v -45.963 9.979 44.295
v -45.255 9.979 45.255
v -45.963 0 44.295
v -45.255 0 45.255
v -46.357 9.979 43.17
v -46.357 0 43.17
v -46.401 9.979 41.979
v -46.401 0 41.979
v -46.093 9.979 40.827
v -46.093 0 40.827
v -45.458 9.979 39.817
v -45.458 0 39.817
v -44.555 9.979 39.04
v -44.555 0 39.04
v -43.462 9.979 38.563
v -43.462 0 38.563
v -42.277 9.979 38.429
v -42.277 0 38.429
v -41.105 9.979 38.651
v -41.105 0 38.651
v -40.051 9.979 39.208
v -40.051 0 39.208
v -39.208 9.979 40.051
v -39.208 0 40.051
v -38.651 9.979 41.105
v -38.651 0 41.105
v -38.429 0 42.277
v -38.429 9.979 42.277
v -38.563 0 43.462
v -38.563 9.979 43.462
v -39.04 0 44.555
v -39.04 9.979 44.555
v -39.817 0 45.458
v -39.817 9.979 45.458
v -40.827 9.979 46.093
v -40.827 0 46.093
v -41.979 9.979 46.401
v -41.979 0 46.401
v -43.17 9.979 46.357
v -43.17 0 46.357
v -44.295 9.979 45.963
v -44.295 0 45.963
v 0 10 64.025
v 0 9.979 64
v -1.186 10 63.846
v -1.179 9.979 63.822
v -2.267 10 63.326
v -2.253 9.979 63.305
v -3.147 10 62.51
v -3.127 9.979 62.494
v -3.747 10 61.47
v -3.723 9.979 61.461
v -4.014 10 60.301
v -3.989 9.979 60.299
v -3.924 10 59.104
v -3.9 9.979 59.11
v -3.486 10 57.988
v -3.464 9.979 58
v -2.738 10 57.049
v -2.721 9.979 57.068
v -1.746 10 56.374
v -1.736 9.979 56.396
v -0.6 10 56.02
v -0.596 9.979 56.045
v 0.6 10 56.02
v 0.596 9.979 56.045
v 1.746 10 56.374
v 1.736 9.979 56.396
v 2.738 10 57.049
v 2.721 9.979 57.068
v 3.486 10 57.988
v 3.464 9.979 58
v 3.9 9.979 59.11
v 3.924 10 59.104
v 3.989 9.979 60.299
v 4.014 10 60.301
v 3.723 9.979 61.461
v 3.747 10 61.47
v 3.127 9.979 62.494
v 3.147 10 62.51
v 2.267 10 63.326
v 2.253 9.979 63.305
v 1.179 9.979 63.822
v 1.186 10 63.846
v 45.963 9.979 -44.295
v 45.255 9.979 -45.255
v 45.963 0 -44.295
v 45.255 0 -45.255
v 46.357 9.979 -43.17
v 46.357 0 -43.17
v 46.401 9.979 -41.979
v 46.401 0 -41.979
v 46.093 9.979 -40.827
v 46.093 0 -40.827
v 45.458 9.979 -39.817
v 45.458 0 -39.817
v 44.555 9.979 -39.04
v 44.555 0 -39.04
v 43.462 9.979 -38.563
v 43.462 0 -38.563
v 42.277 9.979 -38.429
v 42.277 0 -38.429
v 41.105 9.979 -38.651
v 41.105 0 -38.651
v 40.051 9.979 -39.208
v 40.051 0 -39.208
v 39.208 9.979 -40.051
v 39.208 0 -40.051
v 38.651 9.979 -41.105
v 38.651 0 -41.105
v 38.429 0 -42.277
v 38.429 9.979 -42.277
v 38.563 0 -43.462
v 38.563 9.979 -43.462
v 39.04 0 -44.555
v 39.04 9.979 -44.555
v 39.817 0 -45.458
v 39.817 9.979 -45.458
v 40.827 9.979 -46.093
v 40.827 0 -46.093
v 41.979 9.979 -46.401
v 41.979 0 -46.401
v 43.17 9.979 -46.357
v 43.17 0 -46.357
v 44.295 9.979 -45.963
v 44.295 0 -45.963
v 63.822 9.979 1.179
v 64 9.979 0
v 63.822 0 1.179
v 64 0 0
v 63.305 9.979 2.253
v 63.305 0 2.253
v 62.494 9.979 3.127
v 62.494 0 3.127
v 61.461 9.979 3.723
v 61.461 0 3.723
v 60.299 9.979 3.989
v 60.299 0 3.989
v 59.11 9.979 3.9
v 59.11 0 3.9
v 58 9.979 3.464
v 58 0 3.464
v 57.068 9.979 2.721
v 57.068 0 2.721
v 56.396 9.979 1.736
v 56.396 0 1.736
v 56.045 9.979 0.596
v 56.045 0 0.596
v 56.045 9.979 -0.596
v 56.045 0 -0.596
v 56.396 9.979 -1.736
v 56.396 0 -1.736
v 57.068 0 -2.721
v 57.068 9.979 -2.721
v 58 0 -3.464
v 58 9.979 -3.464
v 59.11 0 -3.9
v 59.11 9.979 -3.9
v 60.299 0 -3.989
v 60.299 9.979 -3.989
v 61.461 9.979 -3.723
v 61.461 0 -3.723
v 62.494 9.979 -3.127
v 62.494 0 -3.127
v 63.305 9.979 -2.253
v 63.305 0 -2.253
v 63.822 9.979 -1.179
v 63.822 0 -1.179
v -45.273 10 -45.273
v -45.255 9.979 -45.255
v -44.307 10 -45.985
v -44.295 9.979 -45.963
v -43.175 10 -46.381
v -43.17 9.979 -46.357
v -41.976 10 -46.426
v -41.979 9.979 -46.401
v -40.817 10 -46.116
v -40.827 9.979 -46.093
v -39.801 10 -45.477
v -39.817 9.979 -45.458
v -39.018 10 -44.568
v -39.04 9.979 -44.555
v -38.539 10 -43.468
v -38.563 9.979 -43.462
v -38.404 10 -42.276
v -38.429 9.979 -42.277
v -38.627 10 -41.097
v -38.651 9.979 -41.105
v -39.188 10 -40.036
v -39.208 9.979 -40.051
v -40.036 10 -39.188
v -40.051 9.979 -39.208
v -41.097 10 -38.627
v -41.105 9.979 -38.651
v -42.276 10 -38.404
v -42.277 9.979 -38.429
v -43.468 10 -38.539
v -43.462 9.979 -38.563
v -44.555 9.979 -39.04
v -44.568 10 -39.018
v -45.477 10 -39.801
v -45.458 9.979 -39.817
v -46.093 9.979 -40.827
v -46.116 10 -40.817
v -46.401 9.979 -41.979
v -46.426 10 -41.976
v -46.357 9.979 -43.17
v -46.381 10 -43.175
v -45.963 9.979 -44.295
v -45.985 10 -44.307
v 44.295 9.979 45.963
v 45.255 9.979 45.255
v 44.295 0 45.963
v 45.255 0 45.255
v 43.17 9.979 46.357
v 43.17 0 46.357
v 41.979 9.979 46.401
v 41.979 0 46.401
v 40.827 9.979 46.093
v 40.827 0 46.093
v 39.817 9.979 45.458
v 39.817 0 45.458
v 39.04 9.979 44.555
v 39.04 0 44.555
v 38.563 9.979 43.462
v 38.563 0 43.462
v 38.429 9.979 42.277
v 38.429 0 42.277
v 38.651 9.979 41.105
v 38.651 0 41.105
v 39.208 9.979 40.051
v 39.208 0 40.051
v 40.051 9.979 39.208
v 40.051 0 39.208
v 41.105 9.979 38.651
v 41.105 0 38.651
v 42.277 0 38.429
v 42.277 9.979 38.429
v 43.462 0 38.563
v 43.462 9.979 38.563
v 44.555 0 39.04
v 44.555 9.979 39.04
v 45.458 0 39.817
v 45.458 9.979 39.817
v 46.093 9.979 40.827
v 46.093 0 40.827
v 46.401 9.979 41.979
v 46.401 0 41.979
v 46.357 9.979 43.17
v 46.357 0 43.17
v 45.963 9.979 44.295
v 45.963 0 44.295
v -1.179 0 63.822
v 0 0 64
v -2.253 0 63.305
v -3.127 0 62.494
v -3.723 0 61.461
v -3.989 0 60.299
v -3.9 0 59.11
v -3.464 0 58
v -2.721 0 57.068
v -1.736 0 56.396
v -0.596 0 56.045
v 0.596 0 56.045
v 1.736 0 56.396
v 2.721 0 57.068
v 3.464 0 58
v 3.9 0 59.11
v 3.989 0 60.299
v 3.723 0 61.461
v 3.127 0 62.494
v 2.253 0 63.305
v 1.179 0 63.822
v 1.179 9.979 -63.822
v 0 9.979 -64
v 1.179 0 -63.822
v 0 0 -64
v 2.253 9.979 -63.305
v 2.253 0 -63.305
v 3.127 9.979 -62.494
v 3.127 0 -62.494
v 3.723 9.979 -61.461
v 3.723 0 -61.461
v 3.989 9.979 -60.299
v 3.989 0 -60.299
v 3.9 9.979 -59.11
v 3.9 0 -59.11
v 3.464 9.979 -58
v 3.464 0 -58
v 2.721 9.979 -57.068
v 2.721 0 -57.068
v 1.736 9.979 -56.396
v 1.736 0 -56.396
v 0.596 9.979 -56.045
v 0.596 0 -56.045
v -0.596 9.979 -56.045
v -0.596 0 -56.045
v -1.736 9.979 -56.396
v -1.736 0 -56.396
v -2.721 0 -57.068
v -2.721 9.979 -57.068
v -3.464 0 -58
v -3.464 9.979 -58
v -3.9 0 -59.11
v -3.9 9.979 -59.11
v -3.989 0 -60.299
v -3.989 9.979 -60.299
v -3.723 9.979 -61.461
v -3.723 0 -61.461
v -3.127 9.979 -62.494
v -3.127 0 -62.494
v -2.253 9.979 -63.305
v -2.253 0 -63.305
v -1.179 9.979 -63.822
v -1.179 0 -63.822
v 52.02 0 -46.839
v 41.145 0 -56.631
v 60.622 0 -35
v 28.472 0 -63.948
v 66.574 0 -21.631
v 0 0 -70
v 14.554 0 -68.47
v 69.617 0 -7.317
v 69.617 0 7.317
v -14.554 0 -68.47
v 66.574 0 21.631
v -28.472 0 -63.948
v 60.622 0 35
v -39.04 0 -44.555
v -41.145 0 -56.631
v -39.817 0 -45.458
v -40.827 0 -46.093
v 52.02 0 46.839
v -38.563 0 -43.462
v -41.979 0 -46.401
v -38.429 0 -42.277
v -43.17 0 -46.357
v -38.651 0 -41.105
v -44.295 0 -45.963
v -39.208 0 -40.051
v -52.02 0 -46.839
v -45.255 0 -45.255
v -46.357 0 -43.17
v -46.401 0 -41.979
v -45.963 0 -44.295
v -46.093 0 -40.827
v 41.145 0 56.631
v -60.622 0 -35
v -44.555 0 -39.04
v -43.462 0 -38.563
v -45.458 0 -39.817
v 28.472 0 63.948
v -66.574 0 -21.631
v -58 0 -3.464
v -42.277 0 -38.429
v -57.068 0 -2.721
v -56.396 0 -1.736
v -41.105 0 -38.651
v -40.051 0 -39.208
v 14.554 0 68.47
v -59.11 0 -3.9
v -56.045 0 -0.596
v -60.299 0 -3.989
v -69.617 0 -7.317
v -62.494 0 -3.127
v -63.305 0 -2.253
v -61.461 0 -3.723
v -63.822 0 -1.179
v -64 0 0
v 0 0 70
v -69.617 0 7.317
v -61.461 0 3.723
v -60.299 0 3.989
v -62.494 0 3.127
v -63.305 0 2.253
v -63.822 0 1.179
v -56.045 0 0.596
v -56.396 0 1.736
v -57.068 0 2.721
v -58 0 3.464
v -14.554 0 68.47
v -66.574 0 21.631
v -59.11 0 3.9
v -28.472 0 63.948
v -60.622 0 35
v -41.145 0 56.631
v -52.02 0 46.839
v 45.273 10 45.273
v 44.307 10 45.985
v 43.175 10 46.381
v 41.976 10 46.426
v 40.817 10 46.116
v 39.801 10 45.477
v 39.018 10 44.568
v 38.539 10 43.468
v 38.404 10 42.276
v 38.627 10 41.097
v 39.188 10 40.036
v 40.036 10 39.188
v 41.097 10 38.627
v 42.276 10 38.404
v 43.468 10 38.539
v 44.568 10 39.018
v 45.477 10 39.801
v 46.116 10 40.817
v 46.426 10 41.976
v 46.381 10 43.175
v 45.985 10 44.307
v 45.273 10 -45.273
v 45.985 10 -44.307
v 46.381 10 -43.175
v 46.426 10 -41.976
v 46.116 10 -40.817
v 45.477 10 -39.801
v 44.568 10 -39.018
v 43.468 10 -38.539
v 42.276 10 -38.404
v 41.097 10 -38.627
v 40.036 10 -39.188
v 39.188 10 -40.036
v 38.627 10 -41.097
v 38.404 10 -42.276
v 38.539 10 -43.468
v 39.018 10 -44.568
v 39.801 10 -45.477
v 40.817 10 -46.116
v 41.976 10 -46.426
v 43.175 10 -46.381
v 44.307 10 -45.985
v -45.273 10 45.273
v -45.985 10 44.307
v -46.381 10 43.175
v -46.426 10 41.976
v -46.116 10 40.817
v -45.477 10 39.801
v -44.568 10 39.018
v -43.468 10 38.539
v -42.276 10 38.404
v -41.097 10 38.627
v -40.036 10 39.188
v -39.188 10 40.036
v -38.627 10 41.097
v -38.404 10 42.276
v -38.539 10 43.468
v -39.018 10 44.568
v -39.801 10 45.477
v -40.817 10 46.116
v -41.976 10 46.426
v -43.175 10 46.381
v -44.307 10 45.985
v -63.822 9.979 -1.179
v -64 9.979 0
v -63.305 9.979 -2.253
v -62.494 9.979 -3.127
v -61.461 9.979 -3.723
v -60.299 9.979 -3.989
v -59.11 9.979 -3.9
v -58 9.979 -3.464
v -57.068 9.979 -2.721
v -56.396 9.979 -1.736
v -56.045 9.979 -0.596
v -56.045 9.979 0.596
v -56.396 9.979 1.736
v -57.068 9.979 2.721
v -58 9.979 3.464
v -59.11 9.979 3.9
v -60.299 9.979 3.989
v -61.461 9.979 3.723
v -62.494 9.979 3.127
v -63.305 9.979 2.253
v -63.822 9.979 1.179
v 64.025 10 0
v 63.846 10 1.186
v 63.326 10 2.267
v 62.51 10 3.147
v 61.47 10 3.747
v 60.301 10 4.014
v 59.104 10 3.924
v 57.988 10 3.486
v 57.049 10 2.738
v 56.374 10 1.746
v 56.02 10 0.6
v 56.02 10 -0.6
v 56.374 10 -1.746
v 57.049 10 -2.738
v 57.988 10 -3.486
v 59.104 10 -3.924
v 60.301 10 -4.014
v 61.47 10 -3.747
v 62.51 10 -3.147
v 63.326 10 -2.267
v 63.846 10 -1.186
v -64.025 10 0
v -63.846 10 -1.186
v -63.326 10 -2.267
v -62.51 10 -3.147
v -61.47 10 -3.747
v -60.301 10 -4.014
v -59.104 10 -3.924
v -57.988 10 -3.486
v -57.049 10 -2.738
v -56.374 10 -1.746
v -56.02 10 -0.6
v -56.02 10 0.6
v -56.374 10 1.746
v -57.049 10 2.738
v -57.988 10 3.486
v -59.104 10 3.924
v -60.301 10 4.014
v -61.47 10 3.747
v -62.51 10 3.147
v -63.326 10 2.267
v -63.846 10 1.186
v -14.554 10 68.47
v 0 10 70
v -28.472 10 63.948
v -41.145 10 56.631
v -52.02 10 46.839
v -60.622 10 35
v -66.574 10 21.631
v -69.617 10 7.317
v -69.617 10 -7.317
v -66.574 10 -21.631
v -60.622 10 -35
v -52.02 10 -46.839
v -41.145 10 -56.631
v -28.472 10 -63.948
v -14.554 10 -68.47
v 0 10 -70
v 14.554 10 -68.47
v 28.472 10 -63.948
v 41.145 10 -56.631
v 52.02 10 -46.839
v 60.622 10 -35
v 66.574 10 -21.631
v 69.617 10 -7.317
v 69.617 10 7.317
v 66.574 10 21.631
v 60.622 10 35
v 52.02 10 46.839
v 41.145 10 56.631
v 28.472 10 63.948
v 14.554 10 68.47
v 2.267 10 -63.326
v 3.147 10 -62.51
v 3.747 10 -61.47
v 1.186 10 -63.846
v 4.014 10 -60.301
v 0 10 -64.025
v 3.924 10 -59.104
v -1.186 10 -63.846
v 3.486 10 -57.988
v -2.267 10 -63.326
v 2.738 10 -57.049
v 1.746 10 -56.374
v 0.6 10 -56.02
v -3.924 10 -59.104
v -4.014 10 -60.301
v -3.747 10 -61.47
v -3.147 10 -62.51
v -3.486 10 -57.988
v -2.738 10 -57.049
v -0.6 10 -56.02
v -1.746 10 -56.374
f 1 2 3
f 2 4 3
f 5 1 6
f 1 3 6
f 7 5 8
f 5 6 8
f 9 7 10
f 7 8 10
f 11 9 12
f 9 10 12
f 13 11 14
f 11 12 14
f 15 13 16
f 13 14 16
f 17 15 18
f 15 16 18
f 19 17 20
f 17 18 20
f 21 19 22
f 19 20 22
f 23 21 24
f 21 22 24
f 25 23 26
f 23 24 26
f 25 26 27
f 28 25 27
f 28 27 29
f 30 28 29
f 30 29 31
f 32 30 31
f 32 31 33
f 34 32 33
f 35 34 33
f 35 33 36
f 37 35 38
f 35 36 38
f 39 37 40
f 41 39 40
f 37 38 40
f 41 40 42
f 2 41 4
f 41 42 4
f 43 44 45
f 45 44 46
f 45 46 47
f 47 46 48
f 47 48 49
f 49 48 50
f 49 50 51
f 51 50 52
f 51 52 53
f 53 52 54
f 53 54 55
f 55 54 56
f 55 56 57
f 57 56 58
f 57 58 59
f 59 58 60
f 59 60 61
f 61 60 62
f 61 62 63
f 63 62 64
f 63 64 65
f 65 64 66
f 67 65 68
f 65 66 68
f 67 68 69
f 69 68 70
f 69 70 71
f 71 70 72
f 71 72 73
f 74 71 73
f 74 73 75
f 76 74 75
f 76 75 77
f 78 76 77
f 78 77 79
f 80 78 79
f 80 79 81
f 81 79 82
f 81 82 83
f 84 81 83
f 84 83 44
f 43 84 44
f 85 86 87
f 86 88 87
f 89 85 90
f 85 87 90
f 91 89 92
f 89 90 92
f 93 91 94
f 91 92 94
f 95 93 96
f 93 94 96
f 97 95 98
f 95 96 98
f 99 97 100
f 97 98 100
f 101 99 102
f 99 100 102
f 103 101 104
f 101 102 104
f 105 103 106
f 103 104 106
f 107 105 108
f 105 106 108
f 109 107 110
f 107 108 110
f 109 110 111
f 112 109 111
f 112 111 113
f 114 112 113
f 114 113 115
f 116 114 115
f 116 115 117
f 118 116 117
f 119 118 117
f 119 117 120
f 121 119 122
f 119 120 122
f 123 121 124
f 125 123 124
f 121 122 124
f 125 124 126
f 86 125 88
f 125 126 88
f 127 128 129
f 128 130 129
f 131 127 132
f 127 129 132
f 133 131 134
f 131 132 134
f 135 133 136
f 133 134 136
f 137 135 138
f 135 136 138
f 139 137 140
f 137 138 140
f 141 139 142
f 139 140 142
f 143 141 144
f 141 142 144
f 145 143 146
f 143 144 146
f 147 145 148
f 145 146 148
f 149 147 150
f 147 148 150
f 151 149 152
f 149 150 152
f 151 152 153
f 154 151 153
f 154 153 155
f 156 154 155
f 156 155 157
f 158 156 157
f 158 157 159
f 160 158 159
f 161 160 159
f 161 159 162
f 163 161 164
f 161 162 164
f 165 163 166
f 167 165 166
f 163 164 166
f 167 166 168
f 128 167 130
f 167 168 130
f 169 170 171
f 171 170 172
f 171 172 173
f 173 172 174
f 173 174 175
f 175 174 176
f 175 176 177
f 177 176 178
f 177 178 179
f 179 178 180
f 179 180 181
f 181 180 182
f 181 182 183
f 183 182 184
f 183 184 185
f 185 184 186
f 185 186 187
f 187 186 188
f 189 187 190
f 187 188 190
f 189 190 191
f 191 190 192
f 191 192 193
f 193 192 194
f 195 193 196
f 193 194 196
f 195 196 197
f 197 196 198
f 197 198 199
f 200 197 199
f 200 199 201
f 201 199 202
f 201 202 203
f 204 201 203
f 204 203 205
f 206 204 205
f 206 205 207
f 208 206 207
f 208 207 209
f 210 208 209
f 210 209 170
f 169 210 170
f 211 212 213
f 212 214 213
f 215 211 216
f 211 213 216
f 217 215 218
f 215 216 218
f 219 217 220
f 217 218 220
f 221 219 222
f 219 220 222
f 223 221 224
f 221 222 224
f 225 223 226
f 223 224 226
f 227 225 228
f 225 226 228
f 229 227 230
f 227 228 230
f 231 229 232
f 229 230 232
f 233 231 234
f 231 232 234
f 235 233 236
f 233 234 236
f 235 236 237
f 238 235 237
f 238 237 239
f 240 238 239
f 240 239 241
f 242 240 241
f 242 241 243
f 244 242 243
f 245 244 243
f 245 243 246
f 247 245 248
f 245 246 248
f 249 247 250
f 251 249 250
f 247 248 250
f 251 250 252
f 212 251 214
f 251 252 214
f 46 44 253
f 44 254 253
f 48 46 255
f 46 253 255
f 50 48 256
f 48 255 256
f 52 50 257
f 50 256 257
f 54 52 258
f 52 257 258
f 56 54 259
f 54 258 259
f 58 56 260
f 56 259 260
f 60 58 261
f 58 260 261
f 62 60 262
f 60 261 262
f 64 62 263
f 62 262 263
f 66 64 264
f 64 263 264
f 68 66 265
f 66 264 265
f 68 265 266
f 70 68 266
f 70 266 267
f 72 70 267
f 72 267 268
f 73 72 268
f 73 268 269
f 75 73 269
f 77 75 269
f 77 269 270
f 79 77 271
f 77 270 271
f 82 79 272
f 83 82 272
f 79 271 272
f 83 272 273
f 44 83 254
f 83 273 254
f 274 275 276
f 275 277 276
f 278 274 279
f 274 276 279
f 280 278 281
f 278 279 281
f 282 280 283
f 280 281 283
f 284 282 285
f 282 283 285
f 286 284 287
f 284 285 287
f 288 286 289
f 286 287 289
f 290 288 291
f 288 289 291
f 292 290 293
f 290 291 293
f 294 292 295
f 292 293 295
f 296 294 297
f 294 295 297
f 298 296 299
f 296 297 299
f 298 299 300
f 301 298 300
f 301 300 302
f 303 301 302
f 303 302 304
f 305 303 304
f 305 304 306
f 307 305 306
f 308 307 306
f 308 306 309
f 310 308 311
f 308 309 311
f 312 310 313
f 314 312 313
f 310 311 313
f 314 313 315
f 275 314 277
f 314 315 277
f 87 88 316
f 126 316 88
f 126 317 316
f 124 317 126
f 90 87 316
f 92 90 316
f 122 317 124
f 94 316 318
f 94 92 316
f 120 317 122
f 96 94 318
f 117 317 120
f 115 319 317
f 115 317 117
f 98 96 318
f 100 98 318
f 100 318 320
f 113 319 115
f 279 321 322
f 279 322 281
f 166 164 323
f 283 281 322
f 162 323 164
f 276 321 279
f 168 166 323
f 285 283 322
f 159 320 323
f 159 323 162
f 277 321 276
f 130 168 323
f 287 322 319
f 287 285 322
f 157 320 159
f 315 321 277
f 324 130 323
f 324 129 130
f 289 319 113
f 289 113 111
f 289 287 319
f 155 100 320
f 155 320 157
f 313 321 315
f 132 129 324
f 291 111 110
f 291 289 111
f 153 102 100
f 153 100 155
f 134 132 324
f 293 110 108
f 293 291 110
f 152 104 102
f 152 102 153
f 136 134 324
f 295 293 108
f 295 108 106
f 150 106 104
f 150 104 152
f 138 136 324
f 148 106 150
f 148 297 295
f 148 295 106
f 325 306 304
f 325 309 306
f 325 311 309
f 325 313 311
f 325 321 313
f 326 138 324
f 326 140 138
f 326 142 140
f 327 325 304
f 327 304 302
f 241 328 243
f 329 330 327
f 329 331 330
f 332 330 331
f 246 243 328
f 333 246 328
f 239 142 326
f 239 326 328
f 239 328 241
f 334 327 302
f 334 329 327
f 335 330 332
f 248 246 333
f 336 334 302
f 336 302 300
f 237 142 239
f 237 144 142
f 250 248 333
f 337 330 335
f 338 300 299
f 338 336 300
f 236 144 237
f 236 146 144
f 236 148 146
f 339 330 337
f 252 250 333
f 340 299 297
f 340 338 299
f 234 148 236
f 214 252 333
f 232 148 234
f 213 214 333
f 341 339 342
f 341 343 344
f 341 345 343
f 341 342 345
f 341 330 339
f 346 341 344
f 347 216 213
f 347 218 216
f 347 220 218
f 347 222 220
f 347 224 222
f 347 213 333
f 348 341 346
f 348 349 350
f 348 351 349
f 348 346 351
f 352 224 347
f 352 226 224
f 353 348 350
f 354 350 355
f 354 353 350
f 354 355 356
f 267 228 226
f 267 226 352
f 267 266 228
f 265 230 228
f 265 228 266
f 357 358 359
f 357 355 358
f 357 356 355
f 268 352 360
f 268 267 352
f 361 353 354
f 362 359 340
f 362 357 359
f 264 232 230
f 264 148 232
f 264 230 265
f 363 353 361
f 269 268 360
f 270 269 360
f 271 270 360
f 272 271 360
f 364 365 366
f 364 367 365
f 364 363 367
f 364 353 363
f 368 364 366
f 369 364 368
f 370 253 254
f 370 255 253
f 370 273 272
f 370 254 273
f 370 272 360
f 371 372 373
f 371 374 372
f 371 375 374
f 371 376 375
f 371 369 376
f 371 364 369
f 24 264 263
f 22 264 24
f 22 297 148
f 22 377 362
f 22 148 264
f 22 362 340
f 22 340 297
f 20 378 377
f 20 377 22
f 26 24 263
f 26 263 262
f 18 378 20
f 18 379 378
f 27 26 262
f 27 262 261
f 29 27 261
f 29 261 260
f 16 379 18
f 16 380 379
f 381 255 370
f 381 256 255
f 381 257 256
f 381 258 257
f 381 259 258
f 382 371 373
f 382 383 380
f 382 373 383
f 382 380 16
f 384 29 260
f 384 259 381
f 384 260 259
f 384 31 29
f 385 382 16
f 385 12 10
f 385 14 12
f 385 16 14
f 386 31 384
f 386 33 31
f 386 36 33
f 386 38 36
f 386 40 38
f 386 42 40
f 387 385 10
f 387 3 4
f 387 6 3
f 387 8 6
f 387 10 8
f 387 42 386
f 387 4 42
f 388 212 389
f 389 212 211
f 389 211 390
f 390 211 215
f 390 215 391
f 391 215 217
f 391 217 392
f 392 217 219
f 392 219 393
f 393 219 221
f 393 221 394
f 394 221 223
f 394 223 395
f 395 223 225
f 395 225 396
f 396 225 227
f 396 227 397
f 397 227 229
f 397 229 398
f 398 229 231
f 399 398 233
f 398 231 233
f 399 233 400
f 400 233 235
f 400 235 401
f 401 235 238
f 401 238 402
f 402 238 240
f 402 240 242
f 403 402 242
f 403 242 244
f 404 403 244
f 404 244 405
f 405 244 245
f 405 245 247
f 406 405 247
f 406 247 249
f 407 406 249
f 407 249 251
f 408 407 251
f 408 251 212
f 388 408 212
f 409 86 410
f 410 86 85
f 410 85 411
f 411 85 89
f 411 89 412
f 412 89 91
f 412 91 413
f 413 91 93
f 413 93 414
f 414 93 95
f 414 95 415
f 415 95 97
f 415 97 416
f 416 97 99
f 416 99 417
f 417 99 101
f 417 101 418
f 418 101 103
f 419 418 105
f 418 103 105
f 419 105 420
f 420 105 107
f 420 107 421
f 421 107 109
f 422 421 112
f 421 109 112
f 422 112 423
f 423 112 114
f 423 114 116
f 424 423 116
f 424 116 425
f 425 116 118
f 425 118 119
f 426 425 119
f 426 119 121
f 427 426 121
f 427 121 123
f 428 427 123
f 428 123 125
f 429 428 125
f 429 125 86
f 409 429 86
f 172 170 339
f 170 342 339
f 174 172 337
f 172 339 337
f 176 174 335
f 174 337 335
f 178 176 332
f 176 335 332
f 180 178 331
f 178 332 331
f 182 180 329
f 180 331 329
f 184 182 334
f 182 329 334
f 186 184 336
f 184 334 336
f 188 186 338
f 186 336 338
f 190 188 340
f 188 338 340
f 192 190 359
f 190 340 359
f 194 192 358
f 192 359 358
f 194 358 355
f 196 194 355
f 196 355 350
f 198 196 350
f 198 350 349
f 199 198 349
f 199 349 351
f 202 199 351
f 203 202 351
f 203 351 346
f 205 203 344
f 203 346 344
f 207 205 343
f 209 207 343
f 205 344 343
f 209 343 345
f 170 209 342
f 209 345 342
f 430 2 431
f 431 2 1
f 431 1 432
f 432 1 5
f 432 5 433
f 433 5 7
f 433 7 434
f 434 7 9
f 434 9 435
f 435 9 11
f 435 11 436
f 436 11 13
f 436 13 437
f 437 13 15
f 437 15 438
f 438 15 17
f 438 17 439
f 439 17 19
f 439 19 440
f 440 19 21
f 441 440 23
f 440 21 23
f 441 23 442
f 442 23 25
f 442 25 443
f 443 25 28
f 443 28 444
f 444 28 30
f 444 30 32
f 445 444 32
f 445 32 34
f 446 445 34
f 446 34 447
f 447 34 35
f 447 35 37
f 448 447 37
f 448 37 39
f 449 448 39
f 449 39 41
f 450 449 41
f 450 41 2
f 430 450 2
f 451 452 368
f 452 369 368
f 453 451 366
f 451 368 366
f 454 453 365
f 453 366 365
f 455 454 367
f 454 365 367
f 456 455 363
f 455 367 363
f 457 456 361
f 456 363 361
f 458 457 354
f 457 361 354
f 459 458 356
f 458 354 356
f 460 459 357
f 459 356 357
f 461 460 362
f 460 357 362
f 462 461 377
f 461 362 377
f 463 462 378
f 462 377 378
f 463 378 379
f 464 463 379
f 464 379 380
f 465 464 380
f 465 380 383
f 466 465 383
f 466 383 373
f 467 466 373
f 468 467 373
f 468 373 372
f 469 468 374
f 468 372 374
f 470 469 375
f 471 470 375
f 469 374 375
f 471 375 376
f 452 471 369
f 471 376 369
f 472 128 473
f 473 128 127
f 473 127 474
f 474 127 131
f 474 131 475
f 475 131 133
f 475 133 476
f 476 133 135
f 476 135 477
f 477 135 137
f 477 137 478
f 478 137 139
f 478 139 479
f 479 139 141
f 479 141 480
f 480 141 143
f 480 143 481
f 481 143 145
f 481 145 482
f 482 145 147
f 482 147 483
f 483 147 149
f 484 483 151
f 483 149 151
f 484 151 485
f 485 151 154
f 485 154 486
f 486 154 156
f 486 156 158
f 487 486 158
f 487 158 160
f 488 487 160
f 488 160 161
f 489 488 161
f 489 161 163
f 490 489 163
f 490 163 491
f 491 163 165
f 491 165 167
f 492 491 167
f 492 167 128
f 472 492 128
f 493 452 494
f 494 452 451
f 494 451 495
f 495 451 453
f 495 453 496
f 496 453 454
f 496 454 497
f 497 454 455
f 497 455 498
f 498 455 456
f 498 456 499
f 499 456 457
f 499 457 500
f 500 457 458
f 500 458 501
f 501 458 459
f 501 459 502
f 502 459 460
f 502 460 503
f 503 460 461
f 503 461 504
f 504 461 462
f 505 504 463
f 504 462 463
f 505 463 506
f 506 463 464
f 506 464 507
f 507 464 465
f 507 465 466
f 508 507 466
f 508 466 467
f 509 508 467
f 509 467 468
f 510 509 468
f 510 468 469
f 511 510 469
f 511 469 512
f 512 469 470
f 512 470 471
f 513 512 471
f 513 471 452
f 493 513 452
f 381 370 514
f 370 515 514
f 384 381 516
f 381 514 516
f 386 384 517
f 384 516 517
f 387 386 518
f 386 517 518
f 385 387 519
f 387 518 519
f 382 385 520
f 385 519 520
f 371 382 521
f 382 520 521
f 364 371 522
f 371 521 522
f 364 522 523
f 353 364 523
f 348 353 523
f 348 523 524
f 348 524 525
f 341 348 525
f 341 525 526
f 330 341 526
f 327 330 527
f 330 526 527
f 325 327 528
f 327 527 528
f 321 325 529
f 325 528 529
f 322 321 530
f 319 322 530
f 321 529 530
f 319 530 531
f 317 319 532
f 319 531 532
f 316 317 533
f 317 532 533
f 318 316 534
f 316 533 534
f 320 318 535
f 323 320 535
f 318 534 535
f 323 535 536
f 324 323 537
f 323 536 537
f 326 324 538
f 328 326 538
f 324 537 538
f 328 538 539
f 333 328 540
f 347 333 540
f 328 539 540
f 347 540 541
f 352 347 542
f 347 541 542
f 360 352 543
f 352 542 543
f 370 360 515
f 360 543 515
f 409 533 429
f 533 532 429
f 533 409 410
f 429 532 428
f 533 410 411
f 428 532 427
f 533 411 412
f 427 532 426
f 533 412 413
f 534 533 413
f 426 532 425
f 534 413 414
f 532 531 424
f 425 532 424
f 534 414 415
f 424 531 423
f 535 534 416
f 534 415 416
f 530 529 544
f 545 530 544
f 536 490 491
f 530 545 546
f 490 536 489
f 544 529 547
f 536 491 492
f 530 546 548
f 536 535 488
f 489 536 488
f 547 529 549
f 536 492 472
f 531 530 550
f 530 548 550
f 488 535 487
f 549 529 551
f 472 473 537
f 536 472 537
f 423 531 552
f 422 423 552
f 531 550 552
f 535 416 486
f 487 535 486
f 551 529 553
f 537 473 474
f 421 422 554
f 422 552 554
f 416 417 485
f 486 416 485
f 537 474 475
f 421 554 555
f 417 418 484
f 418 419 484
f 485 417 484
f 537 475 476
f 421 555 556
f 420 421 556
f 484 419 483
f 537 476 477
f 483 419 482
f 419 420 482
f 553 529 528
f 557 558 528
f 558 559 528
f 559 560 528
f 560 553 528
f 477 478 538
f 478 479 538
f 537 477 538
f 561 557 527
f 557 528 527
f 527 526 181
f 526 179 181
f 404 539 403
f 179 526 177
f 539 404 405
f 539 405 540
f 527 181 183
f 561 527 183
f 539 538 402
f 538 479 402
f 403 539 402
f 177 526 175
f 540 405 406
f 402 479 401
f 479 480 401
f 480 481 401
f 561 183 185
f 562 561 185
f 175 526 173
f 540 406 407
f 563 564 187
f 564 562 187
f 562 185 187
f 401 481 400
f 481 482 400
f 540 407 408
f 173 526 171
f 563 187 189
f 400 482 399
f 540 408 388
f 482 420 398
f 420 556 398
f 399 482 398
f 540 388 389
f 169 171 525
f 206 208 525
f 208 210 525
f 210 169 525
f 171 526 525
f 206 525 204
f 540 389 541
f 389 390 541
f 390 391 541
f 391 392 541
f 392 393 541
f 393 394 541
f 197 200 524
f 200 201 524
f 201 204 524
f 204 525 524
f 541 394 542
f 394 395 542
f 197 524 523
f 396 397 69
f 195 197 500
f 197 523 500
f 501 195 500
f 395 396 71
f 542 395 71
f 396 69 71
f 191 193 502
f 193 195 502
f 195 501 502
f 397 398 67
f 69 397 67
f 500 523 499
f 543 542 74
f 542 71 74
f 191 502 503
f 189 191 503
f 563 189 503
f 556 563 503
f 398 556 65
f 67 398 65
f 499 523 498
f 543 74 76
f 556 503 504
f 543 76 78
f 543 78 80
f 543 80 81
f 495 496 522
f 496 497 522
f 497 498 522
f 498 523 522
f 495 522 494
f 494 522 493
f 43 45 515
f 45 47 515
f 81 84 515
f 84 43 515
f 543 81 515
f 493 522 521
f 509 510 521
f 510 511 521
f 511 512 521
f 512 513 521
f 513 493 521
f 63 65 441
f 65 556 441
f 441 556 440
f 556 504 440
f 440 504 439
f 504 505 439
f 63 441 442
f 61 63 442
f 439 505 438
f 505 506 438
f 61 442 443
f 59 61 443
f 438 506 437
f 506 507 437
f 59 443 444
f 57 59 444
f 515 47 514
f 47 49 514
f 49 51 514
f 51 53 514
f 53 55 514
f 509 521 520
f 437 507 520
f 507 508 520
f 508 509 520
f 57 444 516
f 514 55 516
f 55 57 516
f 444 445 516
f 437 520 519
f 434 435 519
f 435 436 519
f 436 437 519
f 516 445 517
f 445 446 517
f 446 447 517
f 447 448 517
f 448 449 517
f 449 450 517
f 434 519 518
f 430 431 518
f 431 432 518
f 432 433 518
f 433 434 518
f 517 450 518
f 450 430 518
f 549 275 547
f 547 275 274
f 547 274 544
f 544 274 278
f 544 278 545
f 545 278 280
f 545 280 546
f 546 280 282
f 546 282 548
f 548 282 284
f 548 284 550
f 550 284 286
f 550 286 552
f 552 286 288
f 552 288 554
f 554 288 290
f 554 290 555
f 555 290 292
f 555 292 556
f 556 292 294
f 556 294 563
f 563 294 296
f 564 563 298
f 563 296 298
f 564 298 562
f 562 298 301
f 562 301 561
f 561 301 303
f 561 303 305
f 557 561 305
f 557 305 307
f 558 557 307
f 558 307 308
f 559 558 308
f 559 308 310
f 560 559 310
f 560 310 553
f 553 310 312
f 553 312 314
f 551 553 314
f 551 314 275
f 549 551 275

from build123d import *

# Parameters (mm, degrees)
SKETCH_1_W                   = 70
SKETCH_1_H                   = 10
HOLE_WIZARD_M8_1_D           = 8
HOLE_WIZARD_M8_1_CSINK_D     = 8.05
HOLE_WIZARD_M8_1_CSINK_ANGLE = 100
PATTERN_CIRCULAR_2_COUNT     = 8


with BuildPart() as part:
    # 草图1 → 旋转1 (revolve)
    with BuildSketch(Plane.XY):
        with Locations((-35, 5)):
            Rectangle(SKETCH_1_W, SKETCH_1_H)
    revolve(axis=Axis((0, 76.619497233, 0), (0, -1, 0)))

    # M8 螺纹孔1 (through all)
    with Locations(Plane(origin=(0, 10, 0), x_dir=(1, 0, 0), z_dir=(0, 1, 0))):
        with Locations((-60, 0)):
            hole_wizard_m8_1 = CounterSinkHole(HOLE_WIZARD_M8_1_D / 2, HOLE_WIZARD_M8_1_CSINK_D / 2, counter_sink_angle=HOLE_WIZARD_M8_1_CSINK_ANGLE)

    # 阵列(圆周)2: M8 螺纹孔1 ×8 about axis
    pattern_circular_2_axis = Axis((0, 76.619497233, 0), (0, -1, 0))
    for i in range(1, PATTERN_CIRCULAR_2_COUNT):
        add(hole_wizard_m8_1.rotate(pattern_circular_2_axis, i * 360 / PATTERN_CIRCULAR_2_COUNT), mode=Mode.SUBTRACT)


solid = part.part
